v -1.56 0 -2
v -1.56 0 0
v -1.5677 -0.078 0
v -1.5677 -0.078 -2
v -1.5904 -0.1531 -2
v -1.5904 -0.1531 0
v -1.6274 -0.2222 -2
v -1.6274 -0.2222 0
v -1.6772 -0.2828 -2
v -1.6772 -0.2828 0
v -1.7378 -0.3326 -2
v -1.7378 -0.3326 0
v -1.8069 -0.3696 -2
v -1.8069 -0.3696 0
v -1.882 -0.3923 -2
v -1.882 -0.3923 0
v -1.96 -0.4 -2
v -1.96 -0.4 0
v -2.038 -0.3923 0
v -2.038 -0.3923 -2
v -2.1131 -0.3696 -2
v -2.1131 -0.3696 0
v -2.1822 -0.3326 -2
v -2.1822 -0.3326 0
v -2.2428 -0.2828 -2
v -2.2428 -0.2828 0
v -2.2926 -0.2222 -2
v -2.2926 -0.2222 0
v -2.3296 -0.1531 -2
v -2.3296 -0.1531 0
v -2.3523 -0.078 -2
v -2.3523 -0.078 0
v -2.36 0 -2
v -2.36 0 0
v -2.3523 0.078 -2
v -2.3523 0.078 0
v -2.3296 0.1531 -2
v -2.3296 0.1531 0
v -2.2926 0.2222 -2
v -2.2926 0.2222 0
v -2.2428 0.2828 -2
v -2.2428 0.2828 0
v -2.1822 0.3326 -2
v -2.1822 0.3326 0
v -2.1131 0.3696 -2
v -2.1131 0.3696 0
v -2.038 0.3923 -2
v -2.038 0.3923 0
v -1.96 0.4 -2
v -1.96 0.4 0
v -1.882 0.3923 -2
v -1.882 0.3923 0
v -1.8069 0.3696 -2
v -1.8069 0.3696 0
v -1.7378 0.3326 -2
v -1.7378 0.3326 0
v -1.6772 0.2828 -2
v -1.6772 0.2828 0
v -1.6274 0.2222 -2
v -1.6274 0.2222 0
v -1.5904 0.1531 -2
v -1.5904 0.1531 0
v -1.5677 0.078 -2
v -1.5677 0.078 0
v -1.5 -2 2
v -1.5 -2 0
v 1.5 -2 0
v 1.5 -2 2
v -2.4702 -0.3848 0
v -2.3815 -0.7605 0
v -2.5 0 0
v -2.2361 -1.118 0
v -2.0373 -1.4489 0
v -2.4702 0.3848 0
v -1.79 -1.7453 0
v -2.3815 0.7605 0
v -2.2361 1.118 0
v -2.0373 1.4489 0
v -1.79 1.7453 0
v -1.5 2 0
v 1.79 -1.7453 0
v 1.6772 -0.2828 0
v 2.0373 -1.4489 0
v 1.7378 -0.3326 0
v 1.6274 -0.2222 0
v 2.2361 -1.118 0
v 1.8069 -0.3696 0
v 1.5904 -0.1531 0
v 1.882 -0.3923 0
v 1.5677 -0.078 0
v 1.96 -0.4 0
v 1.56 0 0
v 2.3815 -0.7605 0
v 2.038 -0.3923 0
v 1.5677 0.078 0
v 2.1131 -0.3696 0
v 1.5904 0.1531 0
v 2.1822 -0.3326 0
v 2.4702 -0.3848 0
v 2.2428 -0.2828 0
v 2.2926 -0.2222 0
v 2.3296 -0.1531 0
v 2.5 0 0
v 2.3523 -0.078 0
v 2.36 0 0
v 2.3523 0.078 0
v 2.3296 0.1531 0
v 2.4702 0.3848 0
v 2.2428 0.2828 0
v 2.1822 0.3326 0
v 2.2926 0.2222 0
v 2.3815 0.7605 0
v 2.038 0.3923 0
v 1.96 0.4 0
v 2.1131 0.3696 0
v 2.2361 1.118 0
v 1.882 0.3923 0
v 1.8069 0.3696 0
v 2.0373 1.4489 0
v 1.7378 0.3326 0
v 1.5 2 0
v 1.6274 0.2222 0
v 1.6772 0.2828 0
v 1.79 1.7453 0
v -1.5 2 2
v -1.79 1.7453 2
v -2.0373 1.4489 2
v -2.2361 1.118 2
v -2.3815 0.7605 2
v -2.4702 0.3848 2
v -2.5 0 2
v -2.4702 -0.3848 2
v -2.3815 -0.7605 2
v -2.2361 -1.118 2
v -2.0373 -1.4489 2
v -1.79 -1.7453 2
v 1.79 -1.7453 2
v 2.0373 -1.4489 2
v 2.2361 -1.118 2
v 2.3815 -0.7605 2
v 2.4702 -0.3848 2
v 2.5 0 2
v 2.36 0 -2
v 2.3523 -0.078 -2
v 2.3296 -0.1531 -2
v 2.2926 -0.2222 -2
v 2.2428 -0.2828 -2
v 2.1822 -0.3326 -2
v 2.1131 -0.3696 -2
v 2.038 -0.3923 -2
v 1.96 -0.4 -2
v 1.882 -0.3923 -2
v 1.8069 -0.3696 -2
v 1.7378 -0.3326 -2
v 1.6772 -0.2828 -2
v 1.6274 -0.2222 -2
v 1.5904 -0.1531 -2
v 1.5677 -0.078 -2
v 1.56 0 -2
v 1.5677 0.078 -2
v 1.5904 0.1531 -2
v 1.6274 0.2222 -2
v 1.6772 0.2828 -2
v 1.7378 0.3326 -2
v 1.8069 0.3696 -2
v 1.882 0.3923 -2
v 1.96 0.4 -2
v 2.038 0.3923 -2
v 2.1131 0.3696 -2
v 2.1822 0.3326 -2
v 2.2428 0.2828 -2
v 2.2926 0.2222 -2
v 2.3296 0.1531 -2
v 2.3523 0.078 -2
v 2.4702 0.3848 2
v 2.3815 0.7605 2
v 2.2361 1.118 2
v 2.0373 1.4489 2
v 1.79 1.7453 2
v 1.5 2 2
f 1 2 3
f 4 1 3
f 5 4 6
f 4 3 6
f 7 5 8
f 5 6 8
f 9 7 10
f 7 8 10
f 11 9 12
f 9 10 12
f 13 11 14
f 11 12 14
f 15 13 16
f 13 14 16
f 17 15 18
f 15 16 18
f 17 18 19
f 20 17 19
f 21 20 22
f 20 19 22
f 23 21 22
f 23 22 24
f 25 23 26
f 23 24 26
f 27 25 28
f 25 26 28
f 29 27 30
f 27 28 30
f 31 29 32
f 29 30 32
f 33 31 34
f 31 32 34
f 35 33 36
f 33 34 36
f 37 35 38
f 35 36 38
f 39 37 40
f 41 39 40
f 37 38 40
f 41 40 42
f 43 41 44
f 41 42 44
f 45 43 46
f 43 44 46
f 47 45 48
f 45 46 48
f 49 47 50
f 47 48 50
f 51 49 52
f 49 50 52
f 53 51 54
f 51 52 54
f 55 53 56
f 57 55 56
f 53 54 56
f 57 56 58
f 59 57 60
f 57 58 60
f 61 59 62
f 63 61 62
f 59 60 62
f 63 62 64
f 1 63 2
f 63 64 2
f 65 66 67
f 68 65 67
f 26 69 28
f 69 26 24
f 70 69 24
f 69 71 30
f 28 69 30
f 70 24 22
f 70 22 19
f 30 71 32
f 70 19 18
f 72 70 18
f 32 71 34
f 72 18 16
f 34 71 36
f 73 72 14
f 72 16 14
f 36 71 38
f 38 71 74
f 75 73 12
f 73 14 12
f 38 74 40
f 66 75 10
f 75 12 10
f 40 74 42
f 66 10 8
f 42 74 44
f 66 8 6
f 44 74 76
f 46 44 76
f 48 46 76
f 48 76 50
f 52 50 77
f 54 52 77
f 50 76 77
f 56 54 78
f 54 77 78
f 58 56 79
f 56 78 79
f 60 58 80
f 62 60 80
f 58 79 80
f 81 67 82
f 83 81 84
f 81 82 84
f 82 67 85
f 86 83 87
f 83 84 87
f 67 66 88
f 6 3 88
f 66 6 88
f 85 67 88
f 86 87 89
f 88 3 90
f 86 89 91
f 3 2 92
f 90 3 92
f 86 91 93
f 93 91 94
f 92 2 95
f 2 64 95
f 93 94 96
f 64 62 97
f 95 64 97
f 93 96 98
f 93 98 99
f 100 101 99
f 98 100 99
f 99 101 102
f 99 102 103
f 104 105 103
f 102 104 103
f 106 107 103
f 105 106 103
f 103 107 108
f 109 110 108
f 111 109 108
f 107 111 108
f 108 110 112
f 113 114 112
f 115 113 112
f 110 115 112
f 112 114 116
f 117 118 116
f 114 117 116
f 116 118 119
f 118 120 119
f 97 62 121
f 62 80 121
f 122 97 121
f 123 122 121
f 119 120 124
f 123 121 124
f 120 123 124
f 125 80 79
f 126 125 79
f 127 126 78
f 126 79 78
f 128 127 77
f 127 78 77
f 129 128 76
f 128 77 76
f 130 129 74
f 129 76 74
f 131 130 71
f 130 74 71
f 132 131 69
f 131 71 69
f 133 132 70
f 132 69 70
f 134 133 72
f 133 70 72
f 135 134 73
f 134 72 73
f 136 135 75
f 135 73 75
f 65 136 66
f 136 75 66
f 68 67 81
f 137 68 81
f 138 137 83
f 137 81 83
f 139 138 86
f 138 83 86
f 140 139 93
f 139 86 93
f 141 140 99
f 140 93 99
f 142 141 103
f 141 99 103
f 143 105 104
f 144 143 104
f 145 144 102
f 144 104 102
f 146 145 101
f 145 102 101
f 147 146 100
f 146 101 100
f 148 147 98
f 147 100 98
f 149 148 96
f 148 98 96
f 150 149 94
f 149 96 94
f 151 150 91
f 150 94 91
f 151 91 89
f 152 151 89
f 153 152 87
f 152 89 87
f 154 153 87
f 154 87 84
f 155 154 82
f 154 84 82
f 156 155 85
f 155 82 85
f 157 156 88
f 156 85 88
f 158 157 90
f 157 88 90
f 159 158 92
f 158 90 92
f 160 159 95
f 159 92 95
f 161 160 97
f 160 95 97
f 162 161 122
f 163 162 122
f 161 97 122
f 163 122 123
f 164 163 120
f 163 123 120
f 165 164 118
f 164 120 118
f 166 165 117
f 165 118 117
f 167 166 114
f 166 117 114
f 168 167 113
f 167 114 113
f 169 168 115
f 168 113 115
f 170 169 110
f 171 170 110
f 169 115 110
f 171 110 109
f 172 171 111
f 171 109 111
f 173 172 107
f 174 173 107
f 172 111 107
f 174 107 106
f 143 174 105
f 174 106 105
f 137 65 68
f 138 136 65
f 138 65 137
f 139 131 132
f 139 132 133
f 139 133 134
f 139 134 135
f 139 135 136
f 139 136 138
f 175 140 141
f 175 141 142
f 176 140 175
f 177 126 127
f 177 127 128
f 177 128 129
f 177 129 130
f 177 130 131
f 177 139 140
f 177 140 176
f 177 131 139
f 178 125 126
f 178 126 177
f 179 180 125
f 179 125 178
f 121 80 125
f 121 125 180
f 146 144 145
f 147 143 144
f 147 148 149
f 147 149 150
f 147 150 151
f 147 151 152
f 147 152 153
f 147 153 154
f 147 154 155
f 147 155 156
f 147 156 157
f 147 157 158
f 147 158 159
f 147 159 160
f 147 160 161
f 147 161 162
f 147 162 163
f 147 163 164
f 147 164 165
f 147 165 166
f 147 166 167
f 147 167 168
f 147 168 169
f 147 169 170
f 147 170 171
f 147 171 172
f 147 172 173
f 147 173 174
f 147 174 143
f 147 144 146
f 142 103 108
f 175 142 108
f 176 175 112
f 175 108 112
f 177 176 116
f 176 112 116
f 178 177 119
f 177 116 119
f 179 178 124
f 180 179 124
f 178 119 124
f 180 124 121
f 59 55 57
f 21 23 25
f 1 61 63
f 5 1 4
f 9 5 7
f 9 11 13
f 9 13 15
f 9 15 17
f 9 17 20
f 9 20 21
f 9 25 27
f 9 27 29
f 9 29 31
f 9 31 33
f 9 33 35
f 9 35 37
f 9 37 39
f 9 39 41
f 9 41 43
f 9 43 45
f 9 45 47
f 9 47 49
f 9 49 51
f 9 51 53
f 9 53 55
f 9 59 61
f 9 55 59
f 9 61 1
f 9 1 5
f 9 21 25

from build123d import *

# Parameters (mm, degrees)
SKETCH_1_W      = 3
SKETCH_1_H      = 4
EXTRUDE_1_DEPTH = 2
SKETCH_2_R      = 0.4
EXTRUDE_2_DEPTH = 2


with BuildPart() as part:
    # Эскиз1 → Бобышка-Вытянуть1 (new body)
    with BuildSketch(Plane.XY):
        with BuildLine():
            ThreePointArc((-1.5, 2), (-2.5, 0), (-1.5, -2))
            Line((-1.5, -2), (-1.5, 2))
        make_face()
        Rectangle(SKETCH_1_W, SKETCH_1_H)
        with BuildLine():
            Line((1.5, 2), (1.5, -2))
            ThreePointArc((1.5, -2), (2.236067977, -1.118033989), (2.5, 0))
            ThreePointArc((2.5, 0), (2.236067977, 1.118033989), (1.5, 2))
        make_face()
    extrude(amount=EXTRUDE_1_DEPTH)

    # Эскиз2 → Бобышка-Вытянуть2 (add)
    with BuildSketch(Plane(origin=(0, 0, 0), x_dir=(-1, 0, 0), z_dir=(0, 0, -1))):
        with Locations(Location((-1.96, 0, 0), (0, 0, 180))):
            Circle(SKETCH_2_R)
        with Locations(Location((1.96, 0, 0), (0, 0, 180))):
            Circle(SKETCH_2_R)
    extrude(amount=EXTRUDE_2_DEPTH)


solid = part.part
